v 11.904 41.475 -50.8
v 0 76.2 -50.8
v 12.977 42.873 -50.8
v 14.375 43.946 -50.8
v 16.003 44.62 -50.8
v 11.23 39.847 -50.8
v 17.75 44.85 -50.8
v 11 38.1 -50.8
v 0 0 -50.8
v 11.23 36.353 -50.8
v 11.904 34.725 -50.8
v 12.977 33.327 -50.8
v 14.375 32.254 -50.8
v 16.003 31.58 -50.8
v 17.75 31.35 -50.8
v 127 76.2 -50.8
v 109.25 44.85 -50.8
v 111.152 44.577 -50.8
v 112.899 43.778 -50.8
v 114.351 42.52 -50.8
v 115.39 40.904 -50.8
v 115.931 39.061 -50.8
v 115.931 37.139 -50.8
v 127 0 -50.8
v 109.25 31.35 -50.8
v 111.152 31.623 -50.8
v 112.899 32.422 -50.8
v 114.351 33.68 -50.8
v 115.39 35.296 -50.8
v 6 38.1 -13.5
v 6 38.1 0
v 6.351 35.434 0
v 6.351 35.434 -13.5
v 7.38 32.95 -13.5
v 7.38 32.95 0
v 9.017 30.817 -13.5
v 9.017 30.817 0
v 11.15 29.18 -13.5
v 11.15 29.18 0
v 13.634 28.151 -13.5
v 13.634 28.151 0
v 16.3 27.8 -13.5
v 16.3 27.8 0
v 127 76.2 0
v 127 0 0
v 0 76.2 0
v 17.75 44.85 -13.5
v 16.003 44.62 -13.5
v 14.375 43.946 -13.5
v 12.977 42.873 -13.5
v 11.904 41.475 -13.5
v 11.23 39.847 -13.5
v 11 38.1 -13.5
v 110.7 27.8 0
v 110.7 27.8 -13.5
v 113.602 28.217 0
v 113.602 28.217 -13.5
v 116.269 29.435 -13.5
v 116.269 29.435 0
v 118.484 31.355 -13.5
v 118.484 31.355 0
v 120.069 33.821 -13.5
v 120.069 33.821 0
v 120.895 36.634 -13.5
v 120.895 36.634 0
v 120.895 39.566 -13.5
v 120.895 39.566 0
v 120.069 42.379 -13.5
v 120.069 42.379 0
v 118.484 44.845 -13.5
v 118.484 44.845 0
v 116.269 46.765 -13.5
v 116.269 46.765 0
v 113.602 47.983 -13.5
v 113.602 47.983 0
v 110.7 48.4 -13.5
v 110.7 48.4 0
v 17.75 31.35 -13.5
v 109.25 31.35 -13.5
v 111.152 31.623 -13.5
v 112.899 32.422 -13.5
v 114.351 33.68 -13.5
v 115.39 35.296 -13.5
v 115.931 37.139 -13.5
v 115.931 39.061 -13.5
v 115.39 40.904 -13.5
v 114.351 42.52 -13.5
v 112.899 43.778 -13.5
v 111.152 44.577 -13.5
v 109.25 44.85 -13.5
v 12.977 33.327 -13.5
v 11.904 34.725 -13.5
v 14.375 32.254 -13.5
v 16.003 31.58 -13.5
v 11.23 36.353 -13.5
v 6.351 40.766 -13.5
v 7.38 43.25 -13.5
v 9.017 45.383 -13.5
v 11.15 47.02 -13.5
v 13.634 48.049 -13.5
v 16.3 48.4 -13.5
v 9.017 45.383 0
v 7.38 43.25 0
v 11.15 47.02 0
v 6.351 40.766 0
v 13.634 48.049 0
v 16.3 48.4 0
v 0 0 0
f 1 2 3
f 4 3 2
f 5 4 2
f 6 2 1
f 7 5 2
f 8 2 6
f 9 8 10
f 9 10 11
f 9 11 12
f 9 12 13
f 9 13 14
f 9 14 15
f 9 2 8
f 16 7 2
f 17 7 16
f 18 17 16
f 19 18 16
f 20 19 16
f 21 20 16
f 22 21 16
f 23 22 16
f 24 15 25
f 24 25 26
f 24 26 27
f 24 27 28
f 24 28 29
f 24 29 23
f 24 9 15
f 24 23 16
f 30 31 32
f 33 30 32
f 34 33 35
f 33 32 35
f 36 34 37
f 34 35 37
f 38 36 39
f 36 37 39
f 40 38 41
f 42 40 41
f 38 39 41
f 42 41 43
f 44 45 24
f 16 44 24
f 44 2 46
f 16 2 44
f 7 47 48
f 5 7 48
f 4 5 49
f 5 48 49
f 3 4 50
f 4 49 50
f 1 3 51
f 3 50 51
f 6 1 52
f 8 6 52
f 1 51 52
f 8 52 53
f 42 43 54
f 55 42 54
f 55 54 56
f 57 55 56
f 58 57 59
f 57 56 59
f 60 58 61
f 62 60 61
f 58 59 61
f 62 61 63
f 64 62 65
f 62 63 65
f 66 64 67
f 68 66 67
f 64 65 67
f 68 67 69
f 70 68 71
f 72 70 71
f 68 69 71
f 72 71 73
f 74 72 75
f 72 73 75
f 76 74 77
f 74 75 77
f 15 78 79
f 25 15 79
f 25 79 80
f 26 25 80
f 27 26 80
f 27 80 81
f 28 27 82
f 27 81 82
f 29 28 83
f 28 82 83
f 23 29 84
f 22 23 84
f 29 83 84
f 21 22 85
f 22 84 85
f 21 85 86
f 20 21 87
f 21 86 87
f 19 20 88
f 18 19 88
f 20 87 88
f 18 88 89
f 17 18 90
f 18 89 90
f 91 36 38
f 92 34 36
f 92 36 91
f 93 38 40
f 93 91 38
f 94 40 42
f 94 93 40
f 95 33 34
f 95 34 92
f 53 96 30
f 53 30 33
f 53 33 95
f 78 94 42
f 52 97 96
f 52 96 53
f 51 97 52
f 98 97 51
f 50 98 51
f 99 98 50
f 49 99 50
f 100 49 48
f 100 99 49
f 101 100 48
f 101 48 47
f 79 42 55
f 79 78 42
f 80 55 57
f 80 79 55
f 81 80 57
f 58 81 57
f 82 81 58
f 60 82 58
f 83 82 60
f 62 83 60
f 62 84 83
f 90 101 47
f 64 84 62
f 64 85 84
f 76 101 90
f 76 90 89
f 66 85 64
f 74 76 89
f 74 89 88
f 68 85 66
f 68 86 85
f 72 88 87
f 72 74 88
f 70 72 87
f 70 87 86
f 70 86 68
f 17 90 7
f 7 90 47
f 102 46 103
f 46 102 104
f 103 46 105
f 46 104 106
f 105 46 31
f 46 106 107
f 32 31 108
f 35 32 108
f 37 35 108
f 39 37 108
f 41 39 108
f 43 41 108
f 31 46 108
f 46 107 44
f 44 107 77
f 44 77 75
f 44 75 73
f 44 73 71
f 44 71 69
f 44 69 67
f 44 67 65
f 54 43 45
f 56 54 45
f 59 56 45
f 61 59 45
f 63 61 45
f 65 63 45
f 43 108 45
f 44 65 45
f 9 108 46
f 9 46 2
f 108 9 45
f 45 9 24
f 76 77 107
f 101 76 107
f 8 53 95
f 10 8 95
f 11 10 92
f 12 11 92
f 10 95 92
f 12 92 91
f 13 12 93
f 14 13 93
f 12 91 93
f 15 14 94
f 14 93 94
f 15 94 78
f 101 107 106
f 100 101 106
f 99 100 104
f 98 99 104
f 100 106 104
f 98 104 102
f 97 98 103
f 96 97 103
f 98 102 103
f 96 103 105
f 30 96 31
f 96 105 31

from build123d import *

# Parameters (mm, degrees)
SKETCH1_W           = 127
SKETCH1_H           = 50.8
BOSS_EXTRUDE1_DEPTH = 76.2
SKETCH2_R           = 6.75
CUT_EXTRUDE5_DEPTH  = 51.8
SKETCH3_R           = 10.3
CUT_EXTRUDE6_DEPTH  = 13.5


with BuildPart() as part:
    # Sketch1 → Boss-Extrude1 (new body)
    with BuildSketch(Plane(origin=(0, 0, 0), x_dir=(1, 0, 0), z_dir=(0, 1, 0))):
        with Locations((63.5, 25.4)):
            Rectangle(SKETCH1_W, SKETCH1_H)
    extrude(amount=BOSS_EXTRUDE1_DEPTH)

    # Sketch2 → Cut-Extrude5 (cut, through all)
    with BuildSketch(Plane.XY):
        with BuildLine():
            Line((63.5, 38.1), (63.5, 31.35))
            Line((63.5, 31.35), (109.25, 31.35))
            ThreePointArc((109.25, 31.35), (102.5, 38.1), (109.25, 44.85))
            Line((109.25, 44.85), (17.75, 44.85))
            ThreePointArc((17.75, 44.85), (22.522970773, 42.872970773), (24.5, 38.1))
            Line((24.5, 38.1), (63.5, 38.1))
        make_face()
        with BuildLine():
            Line((17.75, 31.35), (63.5, 31.35))
            Line((63.5, 31.35), (63.5, 38.1))
            Line((63.5, 38.1), (24.5, 38.1))
            ThreePointArc((24.5, 38.1), (22.522970773, 33.327029227), (17.75, 31.35))
        make_face()
        with Locations((109.25, 38.1)):
            Circle(SKETCH2_R)
        with BuildLine():
            ThreePointArc((17.75, 44.85), (12.977029227, 42.872970773), (11, 38.1))
            Line((11, 38.1), (24.5, 38.1))
            ThreePointArc((24.5, 38.1), (22.522970773, 42.872970773), (17.75, 44.85))
        make_face()
        with BuildLine():
            Line((24.5, 38.1), (11, 38.1))
            ThreePointArc((11, 38.1), (12.977029227, 33.327029227), (17.75, 31.35))
            ThreePointArc((17.75, 31.35), (22.522970773, 33.327029227), (24.5, 38.1))
        make_face()
    extrude(amount=-CUT_EXTRUDE5_DEPTH, mode=Mode.SUBTRACT)

    # Sketch3 → Cut-Extrude6 (cut)
    with BuildSketch(Plane.XY):
        with BuildLine():
            Line((63.5, 38.1), (63.5, 27.8))
            Line((63.5, 27.8), (110.7, 27.8))
            ThreePointArc((110.7, 27.8), (100.4, 38.099999965), (110.699999929, 48.4))
            Line((110.699999929, 48.4), (16.300000257, 48.4))
            ThreePointArc((16.300000257, 48.4), (23.583199937, 45.383199756), (26.6, 38.1))
            Line((26.6, 38.1), (63.5, 38.1))
        make_face()
        with BuildLine():
            Line((16.3, 27.8), (63.5, 27.8))
            Line((63.5, 27.8), (63.5, 38.1))
            Line((63.5, 38.1), (26.6, 38.1))
            ThreePointArc((26.6, 38.1), (23.583199846, 30.816800154), (16.3, 27.8))
        make_face()
        with BuildLine():
            ThreePointArc((16.300000257, 48.4), (9.016800244, 45.383199937), (6, 38.1))
            Line((6, 38.1), (26.6, 38.1))
            ThreePointArc((26.6, 38.1), (23.583199937, 45.383199756), (16.300000257, 48.4))
        make_face()
        with BuildLine():
            Line((26.6, 38.1), (6, 38.1))
            ThreePointArc((6, 38.1), (9.016800154, 30.816800154), (16.3, 27.8))
            ThreePointArc((16.3, 27.8), (23.583199846, 30.816800154), (26.6, 38.1))
        make_face()
        with Locations((110.7, 38.1)):
            Circle(SKETCH3_R)
    extrude(amount=-CUT_EXTRUDE6_DEPTH, mode=Mode.SUBTRACT)


solid = part.part
